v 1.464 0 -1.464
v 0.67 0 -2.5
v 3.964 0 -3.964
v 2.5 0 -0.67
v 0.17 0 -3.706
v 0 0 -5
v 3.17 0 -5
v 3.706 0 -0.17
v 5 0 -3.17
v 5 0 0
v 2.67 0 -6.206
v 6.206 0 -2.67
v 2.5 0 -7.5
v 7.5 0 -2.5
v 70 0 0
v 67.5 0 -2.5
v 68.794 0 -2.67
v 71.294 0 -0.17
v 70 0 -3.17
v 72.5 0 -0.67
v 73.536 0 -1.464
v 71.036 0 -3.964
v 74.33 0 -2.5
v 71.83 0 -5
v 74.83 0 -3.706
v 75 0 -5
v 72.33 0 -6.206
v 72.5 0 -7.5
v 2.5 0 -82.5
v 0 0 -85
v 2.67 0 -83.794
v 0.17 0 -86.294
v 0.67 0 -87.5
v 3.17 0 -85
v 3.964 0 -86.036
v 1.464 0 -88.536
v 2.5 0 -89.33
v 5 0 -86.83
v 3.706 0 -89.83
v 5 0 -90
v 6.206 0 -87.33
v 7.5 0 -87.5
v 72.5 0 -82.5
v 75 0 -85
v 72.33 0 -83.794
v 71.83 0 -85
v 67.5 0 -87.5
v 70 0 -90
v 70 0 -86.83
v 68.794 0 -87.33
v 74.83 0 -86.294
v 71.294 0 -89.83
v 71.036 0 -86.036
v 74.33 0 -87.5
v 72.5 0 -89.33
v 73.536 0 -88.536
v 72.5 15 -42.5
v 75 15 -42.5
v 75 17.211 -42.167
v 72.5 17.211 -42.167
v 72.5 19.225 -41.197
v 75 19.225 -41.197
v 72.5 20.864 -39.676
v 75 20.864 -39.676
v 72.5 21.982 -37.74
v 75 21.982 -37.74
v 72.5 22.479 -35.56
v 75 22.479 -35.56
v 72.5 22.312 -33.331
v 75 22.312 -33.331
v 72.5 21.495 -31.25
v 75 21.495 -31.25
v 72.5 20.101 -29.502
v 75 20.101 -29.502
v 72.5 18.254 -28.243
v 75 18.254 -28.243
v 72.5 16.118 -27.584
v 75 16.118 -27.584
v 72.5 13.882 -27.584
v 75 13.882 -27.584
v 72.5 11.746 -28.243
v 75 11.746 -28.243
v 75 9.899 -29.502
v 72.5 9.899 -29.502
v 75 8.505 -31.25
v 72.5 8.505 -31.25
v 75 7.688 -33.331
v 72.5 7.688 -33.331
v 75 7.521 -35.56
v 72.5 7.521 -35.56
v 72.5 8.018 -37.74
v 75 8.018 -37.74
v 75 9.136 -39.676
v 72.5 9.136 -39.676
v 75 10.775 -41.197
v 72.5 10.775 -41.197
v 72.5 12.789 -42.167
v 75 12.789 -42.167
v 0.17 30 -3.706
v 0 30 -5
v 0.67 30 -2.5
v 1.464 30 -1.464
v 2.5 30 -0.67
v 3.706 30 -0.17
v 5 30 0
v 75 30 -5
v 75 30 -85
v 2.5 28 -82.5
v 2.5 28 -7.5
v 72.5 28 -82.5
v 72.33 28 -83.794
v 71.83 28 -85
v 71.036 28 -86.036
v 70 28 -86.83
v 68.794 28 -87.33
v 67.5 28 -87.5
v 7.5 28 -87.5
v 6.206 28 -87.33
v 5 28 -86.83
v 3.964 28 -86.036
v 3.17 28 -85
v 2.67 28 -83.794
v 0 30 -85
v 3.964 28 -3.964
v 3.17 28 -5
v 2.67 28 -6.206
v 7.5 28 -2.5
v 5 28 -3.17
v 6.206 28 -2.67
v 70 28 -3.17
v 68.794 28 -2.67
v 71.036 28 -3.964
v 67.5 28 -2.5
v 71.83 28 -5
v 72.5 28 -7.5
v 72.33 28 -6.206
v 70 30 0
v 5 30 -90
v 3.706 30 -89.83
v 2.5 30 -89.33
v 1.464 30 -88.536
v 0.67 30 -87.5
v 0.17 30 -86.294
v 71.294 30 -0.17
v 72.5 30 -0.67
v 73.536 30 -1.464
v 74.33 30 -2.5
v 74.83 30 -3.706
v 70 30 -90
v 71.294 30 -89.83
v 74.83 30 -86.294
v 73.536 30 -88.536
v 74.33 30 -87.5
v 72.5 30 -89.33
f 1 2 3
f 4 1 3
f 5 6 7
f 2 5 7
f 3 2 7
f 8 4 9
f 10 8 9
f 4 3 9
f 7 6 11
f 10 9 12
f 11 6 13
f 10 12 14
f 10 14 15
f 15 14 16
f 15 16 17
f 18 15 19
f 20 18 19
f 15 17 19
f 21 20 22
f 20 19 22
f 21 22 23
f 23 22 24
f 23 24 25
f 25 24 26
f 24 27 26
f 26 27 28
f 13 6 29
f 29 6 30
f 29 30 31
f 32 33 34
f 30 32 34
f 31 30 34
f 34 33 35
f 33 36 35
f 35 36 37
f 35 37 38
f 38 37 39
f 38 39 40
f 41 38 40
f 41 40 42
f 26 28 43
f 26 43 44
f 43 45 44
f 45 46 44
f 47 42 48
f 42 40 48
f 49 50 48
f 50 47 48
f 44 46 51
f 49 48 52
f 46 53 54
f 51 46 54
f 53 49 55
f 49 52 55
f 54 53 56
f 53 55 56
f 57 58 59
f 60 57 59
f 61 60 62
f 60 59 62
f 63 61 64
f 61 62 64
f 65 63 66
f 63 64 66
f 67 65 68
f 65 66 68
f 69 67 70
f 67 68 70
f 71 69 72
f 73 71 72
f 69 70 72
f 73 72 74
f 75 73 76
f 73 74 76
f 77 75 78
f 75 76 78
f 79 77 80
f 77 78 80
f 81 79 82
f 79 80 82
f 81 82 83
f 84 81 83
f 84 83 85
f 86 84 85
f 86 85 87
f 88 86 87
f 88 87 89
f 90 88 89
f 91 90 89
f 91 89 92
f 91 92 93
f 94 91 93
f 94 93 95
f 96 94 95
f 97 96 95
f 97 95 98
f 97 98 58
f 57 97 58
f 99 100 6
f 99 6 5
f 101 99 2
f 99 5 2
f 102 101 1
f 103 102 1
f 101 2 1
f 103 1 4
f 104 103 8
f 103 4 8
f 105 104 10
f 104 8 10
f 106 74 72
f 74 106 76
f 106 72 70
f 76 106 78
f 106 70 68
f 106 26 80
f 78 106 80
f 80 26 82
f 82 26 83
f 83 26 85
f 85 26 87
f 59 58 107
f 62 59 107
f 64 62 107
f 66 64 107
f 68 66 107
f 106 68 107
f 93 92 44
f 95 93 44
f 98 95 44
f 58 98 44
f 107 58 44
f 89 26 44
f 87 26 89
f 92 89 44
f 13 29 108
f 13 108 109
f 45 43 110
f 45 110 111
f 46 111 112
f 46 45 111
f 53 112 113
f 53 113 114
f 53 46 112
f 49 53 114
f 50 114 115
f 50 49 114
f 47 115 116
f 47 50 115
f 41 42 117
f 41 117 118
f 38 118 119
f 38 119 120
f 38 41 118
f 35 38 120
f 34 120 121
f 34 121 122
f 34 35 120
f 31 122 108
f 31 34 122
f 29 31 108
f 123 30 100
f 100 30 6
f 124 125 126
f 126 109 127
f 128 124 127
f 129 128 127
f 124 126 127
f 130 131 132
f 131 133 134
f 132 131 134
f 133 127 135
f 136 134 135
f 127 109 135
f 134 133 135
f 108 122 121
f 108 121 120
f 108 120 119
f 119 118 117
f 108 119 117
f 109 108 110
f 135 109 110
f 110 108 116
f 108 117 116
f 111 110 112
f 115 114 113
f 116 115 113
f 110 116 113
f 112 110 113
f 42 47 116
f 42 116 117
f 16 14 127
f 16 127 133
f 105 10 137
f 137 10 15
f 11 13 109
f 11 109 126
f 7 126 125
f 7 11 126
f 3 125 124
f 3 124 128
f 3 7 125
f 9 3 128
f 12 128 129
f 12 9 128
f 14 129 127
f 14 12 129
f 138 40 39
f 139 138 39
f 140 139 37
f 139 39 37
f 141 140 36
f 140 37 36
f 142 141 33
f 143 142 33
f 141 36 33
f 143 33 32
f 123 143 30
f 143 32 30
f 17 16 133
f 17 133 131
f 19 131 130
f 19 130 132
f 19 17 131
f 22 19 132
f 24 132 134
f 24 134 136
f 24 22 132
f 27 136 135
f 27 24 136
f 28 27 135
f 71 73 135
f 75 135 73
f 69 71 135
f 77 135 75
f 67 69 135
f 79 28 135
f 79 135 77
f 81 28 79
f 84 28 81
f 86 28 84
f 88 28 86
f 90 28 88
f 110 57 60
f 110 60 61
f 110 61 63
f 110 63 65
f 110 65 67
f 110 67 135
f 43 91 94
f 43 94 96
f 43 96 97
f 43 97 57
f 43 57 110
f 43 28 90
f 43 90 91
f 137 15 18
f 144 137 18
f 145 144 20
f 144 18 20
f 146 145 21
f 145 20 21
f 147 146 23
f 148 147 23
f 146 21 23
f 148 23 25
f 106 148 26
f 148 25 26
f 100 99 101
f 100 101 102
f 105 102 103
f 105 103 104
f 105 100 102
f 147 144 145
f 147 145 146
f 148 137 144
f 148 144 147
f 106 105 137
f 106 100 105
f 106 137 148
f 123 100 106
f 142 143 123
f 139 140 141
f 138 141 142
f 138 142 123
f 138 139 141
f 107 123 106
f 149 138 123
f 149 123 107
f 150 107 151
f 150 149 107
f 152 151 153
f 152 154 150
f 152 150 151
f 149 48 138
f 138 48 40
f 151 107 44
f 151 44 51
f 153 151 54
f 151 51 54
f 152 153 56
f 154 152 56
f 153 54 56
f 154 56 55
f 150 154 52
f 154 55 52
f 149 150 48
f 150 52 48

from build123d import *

# Parameters (mm, degrees)
BOSS_EXTRUDE1_DEPTH = 30
CUT_EXTRUDE3_DEPTH  = 28
SKETCH5_R           = 7.5
CUT_EXTRUDE5_DEPTH  = 4


with BuildPart() as part:
    # Sketch1 → Boss-Extrude1 (new body)
    with BuildSketch(Plane(origin=(0, 0, 0), x_dir=(1, 0, 0), z_dir=(0, 1, 0))):
        with BuildLine():
            Line((5, 0), (70, 0))
            ThreePointArc((70, 0), (73.535533906, 1.464466094), (75, 5))
            Line((75, 5), (75, 85))
            ThreePointArc((75, 85), (73.535533906, 88.535533906), (70, 90))
            Line((70, 90), (5, 90))
            ThreePointArc((5, 90), (1.464466094, 88.535533906), (0, 85))
            Line((0, 85), (0, 5))
            ThreePointArc((0, 5), (1.464466094, 1.464466094), (5, 0))
        make_face()
    extrude(amount=BOSS_EXTRUDE1_DEPTH)

    # Sketch3 → Cut-Extrude3 (cut)
    with BuildSketch(Plane(origin=(0, 0, 0), x_dir=(-1, 0, 0), z_dir=(0, -1, 0))):
        with BuildLine():
            Line((-7.5, 2.5), (-67.5, 2.5))
            ThreePointArc((-67.5, 2.5), (-71.035533906, 3.964466094), (-72.5, 7.5))
            Line((-72.5, 7.5), (-72.5, 82.5))
            ThreePointArc((-72.5, 82.5), (-71.035533906, 86.035533906), (-67.5, 87.5))
            Line((-67.5, 87.5), (-7.5, 87.5))
            ThreePointArc((-7.5, 87.5), (-3.964466094, 86.035533906), (-2.5, 82.5))
            Line((-2.5, 82.5), (-2.5, 7.5))
            ThreePointArc((-2.5, 7.5), (-3.964466094, 3.964466094), (-7.5, 2.5))
        make_face()
    extrude(amount=-CUT_EXTRUDE3_DEPTH, mode=Mode.SUBTRACT)

    # Sketch5 → Cut-Extrude5 (cut)
    with BuildSketch(Plane(origin=(75, 0, 0), x_dir=(0, 0, -1), z_dir=(1, 0, 0))):
        with Locations((35, 15)):
            Circle(SKETCH5_R)
    extrude(amount=-CUT_EXTRUDE5_DEPTH, mode=Mode.SUBTRACT)


solid = part.part
